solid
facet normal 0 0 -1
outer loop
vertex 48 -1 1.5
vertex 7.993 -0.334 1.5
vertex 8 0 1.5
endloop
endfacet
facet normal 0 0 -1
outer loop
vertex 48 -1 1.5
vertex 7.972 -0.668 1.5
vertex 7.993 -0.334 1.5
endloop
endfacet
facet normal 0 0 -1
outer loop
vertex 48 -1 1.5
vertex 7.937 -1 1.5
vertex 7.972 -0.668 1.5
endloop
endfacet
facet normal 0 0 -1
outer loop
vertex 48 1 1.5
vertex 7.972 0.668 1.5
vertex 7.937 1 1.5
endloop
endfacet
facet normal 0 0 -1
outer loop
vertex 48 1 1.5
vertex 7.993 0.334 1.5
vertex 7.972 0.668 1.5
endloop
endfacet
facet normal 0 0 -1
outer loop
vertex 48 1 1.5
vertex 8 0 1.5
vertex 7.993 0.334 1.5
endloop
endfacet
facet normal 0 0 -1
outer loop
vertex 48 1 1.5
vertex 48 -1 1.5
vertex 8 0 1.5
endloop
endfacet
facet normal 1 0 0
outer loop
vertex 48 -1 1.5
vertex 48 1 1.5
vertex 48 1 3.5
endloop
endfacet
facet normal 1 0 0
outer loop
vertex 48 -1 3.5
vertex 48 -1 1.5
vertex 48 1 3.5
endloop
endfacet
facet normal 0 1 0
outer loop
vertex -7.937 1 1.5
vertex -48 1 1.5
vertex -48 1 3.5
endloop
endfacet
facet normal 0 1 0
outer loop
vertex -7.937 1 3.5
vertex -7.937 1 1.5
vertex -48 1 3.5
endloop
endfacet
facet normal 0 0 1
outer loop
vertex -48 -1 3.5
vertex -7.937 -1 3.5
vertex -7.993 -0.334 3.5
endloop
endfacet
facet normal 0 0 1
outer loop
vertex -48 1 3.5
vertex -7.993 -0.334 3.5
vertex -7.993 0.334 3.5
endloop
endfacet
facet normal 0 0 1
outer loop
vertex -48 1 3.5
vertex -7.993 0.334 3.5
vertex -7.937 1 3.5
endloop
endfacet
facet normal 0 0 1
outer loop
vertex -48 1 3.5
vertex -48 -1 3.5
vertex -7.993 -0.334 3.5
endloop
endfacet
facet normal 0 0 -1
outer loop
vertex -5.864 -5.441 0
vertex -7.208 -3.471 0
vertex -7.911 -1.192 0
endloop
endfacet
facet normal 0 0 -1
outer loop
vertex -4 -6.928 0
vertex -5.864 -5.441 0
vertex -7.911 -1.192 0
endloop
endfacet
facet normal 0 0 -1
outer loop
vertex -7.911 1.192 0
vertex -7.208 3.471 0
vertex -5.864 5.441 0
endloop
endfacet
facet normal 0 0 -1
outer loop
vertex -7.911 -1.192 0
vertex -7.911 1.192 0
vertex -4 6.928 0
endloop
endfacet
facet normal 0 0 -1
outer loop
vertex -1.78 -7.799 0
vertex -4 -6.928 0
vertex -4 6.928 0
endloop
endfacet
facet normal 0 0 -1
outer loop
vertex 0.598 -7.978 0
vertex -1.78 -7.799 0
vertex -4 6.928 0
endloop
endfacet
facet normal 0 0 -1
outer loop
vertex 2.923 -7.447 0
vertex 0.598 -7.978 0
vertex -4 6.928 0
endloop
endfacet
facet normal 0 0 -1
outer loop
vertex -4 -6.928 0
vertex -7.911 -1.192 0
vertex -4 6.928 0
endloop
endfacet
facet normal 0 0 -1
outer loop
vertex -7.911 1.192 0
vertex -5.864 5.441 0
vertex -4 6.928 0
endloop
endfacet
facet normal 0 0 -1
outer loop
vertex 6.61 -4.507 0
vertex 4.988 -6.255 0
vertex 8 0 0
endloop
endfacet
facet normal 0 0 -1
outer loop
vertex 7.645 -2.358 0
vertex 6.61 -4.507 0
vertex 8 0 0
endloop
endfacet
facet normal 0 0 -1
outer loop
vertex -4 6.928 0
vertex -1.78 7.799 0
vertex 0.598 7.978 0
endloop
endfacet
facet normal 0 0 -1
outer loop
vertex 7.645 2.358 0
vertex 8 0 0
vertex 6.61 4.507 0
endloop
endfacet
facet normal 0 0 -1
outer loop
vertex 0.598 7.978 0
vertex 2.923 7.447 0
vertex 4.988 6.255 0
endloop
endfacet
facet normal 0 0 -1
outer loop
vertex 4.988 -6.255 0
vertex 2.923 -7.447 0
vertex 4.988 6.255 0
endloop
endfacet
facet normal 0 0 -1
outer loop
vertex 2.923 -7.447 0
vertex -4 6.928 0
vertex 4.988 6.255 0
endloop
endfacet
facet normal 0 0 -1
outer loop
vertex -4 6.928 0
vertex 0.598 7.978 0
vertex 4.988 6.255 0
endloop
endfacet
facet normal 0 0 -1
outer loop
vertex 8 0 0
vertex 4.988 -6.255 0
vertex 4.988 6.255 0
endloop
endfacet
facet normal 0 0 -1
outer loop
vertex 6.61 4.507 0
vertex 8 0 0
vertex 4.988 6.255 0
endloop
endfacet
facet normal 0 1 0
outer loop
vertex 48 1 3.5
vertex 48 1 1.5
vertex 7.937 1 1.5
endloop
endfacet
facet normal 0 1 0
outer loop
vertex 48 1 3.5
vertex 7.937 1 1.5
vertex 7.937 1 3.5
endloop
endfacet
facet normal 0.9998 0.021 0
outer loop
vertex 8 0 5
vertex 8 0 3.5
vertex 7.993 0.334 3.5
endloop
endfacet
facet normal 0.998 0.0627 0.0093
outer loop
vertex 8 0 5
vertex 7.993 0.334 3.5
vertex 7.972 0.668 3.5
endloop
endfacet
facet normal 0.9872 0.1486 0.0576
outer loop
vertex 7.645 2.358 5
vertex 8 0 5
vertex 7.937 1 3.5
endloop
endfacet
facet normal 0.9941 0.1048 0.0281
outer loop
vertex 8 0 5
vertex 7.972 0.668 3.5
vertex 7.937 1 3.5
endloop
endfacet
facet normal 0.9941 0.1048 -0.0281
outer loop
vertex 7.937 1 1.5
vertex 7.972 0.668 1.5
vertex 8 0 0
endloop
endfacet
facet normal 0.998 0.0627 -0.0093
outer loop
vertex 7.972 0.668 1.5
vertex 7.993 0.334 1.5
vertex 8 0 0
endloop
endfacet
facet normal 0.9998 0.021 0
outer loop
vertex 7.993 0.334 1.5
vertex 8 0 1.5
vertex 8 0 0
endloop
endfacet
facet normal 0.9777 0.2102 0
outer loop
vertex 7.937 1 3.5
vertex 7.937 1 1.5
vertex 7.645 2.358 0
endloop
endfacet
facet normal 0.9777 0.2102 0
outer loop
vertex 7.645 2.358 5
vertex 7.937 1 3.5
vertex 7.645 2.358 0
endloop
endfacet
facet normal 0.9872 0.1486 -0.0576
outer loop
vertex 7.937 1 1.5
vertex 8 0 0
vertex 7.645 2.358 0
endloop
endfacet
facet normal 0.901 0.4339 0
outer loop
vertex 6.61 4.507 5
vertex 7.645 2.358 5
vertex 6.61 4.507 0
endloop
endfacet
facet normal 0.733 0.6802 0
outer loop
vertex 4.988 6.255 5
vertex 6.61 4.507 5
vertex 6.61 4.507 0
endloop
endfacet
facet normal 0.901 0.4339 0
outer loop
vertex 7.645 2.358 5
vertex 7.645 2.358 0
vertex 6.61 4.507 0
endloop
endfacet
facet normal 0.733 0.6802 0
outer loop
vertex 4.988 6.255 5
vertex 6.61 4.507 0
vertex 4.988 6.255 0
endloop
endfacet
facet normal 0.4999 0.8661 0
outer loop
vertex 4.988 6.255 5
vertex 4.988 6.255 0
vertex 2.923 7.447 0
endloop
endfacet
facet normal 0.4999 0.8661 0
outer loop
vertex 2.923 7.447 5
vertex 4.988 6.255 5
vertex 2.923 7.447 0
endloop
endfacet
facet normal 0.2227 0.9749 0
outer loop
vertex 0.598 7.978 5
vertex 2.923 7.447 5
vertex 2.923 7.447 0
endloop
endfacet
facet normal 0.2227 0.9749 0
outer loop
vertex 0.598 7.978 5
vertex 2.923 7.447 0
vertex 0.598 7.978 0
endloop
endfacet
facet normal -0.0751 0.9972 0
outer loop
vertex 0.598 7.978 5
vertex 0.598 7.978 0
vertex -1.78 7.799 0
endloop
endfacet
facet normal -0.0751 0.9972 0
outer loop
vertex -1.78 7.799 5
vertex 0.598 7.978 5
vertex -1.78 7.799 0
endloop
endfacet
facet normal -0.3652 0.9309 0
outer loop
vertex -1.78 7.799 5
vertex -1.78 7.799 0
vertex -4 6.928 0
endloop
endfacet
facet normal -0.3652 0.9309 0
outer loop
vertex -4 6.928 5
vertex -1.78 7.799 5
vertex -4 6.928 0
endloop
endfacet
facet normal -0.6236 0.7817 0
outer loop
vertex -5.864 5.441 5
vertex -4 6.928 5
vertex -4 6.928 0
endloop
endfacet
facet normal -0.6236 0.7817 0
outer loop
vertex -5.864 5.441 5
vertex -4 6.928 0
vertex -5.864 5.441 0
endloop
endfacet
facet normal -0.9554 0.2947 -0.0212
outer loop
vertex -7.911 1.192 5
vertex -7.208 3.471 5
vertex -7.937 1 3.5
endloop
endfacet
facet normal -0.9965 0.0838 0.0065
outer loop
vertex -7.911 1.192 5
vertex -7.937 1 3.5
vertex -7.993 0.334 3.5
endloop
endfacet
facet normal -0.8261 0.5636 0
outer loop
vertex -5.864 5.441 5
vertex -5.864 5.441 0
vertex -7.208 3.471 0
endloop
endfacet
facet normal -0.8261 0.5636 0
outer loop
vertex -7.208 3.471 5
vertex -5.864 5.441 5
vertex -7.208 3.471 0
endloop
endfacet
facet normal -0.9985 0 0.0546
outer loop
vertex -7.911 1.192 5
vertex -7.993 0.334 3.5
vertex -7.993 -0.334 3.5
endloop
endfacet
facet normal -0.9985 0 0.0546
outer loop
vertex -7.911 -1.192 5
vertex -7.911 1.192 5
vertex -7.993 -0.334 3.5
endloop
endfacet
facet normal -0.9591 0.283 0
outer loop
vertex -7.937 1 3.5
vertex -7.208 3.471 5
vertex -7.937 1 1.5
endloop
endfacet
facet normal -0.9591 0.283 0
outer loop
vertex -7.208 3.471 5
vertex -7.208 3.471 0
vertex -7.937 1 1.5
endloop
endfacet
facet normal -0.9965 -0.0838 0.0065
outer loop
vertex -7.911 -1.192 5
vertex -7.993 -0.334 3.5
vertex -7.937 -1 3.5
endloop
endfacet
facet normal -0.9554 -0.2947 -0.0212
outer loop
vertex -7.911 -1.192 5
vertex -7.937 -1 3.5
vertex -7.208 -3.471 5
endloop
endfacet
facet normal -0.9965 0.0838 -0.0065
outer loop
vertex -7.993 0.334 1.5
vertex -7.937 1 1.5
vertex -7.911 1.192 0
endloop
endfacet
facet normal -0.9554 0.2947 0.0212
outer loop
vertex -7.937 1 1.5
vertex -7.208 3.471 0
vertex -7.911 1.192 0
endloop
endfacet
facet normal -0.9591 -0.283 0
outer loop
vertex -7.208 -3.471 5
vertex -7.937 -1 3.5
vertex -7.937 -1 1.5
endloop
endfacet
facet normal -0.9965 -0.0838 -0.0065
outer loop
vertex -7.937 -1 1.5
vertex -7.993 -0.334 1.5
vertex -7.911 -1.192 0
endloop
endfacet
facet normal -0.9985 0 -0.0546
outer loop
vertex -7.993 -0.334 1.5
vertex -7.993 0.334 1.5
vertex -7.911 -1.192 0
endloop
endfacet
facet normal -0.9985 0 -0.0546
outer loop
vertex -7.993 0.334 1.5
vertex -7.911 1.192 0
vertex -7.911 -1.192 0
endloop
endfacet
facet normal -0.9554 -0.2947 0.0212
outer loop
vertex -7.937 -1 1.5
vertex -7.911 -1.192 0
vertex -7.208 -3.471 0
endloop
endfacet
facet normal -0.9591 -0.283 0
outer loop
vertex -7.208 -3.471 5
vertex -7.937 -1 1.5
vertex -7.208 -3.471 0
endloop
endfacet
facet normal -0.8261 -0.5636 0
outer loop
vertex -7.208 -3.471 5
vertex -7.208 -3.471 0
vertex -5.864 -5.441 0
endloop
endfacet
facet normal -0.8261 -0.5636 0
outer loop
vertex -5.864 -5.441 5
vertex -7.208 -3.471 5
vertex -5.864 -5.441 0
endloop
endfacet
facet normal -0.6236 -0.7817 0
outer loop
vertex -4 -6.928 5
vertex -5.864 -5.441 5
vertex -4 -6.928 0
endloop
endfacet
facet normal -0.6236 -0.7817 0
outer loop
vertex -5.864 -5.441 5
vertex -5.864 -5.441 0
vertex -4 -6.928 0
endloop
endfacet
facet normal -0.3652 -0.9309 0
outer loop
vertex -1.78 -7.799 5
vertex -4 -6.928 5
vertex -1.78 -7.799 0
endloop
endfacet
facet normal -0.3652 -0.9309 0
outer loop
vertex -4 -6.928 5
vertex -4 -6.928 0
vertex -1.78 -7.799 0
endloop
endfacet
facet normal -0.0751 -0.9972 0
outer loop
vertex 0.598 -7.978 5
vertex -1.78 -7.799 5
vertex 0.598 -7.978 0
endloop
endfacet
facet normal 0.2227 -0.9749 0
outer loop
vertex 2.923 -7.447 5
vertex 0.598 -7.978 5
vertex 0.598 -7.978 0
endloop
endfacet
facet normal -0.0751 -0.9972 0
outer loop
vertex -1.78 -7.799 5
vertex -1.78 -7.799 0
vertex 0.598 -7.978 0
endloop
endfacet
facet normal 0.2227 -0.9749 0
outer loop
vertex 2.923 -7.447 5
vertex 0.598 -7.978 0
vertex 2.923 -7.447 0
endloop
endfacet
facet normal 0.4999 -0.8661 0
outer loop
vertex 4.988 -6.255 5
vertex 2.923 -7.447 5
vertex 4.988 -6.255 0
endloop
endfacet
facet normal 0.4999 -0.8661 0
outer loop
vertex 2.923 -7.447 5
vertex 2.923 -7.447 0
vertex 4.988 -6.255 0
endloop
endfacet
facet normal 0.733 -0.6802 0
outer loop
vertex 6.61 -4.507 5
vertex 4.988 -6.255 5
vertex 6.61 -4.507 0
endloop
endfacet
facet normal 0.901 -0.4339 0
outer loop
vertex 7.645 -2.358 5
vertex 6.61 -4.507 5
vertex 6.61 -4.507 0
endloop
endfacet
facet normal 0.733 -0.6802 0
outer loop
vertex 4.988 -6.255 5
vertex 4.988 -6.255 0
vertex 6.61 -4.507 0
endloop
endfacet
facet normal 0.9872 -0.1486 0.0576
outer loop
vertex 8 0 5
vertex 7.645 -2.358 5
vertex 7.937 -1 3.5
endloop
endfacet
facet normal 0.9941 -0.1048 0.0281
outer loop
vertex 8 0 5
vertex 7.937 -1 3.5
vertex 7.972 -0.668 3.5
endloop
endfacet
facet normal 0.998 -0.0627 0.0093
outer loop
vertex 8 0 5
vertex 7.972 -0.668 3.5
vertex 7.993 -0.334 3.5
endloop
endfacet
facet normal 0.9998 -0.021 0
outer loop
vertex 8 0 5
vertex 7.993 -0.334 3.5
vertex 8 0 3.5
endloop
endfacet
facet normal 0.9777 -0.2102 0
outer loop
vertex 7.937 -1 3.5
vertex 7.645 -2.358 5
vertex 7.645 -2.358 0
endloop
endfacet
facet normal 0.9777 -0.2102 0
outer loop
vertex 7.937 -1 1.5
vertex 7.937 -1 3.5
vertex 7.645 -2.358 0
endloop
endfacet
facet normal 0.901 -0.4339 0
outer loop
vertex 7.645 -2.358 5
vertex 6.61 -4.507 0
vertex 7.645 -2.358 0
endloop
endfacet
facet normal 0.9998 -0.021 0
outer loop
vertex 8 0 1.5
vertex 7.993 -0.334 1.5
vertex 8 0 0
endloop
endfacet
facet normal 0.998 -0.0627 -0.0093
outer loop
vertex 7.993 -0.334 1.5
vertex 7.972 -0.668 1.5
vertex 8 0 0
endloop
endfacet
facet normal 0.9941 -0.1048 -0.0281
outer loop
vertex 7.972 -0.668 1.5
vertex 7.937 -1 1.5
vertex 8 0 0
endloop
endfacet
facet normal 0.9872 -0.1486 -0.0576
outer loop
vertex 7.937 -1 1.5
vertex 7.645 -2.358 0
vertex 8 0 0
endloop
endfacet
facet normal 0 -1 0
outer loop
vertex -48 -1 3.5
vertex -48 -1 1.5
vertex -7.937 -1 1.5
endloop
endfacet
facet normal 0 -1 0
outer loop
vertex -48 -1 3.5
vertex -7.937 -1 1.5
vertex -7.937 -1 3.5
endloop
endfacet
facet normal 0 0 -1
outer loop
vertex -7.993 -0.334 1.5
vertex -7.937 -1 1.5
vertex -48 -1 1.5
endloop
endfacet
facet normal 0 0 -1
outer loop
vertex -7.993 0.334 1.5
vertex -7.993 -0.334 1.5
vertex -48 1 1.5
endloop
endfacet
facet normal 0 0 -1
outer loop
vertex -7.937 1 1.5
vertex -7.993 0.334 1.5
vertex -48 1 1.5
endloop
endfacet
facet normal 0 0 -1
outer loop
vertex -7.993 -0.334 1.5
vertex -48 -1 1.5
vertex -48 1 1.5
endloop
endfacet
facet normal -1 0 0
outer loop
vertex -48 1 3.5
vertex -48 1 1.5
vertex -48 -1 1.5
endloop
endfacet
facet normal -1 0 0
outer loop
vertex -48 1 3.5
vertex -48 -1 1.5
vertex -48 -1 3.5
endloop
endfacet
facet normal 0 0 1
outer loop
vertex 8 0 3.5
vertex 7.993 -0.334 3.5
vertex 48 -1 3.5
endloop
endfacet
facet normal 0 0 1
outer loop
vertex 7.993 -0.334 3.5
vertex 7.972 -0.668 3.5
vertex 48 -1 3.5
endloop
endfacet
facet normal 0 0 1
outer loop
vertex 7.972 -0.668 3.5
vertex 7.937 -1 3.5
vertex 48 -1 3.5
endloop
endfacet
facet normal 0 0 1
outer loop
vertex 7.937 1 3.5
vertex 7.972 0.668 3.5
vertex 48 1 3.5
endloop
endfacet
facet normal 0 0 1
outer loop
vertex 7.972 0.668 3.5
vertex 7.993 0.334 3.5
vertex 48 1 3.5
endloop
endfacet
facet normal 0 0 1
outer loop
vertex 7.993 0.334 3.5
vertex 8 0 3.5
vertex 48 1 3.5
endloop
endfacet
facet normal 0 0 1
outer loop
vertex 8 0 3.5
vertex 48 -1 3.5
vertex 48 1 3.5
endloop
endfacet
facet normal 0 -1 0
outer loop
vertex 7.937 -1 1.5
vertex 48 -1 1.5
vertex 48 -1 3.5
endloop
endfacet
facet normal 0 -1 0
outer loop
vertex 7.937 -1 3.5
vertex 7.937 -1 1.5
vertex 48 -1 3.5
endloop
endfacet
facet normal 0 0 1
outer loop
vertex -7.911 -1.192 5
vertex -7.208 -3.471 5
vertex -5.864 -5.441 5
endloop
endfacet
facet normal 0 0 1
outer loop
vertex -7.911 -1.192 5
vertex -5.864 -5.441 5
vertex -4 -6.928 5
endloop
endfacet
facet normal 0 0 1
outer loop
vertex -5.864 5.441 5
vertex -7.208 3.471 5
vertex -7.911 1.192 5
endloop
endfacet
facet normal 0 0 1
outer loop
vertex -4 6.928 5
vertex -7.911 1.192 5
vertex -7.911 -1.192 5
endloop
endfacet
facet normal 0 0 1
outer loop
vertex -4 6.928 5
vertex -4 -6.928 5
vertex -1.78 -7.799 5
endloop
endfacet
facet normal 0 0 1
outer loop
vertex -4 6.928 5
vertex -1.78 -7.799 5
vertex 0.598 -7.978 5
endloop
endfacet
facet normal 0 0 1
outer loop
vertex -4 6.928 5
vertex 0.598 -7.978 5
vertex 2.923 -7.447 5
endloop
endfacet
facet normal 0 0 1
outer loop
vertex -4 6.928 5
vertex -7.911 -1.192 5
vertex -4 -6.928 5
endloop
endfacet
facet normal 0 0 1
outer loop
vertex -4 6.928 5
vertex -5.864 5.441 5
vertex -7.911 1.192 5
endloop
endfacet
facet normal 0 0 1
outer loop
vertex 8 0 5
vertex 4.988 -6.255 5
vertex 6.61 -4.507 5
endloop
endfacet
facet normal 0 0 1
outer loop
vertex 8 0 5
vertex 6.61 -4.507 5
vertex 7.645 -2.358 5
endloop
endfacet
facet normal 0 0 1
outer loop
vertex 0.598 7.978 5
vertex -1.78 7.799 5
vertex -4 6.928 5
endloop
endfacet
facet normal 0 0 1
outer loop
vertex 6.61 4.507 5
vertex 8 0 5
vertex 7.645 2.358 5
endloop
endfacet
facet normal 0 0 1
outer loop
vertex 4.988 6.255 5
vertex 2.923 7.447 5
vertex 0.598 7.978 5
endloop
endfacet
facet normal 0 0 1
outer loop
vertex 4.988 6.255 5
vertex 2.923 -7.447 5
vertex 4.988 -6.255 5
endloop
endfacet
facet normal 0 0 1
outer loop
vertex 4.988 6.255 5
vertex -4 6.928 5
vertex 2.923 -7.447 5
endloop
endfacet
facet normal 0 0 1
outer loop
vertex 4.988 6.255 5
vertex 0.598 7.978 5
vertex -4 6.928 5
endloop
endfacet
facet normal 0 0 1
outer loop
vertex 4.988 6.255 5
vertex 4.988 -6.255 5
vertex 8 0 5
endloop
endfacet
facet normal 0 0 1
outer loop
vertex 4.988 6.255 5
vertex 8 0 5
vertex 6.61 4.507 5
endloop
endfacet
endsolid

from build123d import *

# Parameters (mm, degrees)
SKETCH1_R           = 8
BOSS_EXTRUDE1_DEPTH = 5
SKETCH2_W           = 2
SKETCH2_H           = 2
BOSS_EXTRUDE2_DEPTH = 48


with BuildPart() as part:
    # Sketch1 → Boss-Extrude1 (new body)
    with BuildSketch(Plane.XY):
        Circle(SKETCH1_R)
    extrude(amount=BOSS_EXTRUDE1_DEPTH)

    # Sketch2 → Boss-Extrude2 (add)
    with BuildSketch(Plane.ZY.offset(48)):
        with Locations((2.5, 0)):
            Rectangle(SKETCH2_W, SKETCH2_H)
    boss_extrude2 = extrude(amount=-BOSS_EXTRUDE2_DEPTH)

    # Mirror1: Boss-Extrude2 across plane
    add(boss_extrude2.mirror(Plane(origin=(0, 0, 0), x_dir=(0, 0, 1), z_dir=(1, 0, 0))))


solid = part.part
